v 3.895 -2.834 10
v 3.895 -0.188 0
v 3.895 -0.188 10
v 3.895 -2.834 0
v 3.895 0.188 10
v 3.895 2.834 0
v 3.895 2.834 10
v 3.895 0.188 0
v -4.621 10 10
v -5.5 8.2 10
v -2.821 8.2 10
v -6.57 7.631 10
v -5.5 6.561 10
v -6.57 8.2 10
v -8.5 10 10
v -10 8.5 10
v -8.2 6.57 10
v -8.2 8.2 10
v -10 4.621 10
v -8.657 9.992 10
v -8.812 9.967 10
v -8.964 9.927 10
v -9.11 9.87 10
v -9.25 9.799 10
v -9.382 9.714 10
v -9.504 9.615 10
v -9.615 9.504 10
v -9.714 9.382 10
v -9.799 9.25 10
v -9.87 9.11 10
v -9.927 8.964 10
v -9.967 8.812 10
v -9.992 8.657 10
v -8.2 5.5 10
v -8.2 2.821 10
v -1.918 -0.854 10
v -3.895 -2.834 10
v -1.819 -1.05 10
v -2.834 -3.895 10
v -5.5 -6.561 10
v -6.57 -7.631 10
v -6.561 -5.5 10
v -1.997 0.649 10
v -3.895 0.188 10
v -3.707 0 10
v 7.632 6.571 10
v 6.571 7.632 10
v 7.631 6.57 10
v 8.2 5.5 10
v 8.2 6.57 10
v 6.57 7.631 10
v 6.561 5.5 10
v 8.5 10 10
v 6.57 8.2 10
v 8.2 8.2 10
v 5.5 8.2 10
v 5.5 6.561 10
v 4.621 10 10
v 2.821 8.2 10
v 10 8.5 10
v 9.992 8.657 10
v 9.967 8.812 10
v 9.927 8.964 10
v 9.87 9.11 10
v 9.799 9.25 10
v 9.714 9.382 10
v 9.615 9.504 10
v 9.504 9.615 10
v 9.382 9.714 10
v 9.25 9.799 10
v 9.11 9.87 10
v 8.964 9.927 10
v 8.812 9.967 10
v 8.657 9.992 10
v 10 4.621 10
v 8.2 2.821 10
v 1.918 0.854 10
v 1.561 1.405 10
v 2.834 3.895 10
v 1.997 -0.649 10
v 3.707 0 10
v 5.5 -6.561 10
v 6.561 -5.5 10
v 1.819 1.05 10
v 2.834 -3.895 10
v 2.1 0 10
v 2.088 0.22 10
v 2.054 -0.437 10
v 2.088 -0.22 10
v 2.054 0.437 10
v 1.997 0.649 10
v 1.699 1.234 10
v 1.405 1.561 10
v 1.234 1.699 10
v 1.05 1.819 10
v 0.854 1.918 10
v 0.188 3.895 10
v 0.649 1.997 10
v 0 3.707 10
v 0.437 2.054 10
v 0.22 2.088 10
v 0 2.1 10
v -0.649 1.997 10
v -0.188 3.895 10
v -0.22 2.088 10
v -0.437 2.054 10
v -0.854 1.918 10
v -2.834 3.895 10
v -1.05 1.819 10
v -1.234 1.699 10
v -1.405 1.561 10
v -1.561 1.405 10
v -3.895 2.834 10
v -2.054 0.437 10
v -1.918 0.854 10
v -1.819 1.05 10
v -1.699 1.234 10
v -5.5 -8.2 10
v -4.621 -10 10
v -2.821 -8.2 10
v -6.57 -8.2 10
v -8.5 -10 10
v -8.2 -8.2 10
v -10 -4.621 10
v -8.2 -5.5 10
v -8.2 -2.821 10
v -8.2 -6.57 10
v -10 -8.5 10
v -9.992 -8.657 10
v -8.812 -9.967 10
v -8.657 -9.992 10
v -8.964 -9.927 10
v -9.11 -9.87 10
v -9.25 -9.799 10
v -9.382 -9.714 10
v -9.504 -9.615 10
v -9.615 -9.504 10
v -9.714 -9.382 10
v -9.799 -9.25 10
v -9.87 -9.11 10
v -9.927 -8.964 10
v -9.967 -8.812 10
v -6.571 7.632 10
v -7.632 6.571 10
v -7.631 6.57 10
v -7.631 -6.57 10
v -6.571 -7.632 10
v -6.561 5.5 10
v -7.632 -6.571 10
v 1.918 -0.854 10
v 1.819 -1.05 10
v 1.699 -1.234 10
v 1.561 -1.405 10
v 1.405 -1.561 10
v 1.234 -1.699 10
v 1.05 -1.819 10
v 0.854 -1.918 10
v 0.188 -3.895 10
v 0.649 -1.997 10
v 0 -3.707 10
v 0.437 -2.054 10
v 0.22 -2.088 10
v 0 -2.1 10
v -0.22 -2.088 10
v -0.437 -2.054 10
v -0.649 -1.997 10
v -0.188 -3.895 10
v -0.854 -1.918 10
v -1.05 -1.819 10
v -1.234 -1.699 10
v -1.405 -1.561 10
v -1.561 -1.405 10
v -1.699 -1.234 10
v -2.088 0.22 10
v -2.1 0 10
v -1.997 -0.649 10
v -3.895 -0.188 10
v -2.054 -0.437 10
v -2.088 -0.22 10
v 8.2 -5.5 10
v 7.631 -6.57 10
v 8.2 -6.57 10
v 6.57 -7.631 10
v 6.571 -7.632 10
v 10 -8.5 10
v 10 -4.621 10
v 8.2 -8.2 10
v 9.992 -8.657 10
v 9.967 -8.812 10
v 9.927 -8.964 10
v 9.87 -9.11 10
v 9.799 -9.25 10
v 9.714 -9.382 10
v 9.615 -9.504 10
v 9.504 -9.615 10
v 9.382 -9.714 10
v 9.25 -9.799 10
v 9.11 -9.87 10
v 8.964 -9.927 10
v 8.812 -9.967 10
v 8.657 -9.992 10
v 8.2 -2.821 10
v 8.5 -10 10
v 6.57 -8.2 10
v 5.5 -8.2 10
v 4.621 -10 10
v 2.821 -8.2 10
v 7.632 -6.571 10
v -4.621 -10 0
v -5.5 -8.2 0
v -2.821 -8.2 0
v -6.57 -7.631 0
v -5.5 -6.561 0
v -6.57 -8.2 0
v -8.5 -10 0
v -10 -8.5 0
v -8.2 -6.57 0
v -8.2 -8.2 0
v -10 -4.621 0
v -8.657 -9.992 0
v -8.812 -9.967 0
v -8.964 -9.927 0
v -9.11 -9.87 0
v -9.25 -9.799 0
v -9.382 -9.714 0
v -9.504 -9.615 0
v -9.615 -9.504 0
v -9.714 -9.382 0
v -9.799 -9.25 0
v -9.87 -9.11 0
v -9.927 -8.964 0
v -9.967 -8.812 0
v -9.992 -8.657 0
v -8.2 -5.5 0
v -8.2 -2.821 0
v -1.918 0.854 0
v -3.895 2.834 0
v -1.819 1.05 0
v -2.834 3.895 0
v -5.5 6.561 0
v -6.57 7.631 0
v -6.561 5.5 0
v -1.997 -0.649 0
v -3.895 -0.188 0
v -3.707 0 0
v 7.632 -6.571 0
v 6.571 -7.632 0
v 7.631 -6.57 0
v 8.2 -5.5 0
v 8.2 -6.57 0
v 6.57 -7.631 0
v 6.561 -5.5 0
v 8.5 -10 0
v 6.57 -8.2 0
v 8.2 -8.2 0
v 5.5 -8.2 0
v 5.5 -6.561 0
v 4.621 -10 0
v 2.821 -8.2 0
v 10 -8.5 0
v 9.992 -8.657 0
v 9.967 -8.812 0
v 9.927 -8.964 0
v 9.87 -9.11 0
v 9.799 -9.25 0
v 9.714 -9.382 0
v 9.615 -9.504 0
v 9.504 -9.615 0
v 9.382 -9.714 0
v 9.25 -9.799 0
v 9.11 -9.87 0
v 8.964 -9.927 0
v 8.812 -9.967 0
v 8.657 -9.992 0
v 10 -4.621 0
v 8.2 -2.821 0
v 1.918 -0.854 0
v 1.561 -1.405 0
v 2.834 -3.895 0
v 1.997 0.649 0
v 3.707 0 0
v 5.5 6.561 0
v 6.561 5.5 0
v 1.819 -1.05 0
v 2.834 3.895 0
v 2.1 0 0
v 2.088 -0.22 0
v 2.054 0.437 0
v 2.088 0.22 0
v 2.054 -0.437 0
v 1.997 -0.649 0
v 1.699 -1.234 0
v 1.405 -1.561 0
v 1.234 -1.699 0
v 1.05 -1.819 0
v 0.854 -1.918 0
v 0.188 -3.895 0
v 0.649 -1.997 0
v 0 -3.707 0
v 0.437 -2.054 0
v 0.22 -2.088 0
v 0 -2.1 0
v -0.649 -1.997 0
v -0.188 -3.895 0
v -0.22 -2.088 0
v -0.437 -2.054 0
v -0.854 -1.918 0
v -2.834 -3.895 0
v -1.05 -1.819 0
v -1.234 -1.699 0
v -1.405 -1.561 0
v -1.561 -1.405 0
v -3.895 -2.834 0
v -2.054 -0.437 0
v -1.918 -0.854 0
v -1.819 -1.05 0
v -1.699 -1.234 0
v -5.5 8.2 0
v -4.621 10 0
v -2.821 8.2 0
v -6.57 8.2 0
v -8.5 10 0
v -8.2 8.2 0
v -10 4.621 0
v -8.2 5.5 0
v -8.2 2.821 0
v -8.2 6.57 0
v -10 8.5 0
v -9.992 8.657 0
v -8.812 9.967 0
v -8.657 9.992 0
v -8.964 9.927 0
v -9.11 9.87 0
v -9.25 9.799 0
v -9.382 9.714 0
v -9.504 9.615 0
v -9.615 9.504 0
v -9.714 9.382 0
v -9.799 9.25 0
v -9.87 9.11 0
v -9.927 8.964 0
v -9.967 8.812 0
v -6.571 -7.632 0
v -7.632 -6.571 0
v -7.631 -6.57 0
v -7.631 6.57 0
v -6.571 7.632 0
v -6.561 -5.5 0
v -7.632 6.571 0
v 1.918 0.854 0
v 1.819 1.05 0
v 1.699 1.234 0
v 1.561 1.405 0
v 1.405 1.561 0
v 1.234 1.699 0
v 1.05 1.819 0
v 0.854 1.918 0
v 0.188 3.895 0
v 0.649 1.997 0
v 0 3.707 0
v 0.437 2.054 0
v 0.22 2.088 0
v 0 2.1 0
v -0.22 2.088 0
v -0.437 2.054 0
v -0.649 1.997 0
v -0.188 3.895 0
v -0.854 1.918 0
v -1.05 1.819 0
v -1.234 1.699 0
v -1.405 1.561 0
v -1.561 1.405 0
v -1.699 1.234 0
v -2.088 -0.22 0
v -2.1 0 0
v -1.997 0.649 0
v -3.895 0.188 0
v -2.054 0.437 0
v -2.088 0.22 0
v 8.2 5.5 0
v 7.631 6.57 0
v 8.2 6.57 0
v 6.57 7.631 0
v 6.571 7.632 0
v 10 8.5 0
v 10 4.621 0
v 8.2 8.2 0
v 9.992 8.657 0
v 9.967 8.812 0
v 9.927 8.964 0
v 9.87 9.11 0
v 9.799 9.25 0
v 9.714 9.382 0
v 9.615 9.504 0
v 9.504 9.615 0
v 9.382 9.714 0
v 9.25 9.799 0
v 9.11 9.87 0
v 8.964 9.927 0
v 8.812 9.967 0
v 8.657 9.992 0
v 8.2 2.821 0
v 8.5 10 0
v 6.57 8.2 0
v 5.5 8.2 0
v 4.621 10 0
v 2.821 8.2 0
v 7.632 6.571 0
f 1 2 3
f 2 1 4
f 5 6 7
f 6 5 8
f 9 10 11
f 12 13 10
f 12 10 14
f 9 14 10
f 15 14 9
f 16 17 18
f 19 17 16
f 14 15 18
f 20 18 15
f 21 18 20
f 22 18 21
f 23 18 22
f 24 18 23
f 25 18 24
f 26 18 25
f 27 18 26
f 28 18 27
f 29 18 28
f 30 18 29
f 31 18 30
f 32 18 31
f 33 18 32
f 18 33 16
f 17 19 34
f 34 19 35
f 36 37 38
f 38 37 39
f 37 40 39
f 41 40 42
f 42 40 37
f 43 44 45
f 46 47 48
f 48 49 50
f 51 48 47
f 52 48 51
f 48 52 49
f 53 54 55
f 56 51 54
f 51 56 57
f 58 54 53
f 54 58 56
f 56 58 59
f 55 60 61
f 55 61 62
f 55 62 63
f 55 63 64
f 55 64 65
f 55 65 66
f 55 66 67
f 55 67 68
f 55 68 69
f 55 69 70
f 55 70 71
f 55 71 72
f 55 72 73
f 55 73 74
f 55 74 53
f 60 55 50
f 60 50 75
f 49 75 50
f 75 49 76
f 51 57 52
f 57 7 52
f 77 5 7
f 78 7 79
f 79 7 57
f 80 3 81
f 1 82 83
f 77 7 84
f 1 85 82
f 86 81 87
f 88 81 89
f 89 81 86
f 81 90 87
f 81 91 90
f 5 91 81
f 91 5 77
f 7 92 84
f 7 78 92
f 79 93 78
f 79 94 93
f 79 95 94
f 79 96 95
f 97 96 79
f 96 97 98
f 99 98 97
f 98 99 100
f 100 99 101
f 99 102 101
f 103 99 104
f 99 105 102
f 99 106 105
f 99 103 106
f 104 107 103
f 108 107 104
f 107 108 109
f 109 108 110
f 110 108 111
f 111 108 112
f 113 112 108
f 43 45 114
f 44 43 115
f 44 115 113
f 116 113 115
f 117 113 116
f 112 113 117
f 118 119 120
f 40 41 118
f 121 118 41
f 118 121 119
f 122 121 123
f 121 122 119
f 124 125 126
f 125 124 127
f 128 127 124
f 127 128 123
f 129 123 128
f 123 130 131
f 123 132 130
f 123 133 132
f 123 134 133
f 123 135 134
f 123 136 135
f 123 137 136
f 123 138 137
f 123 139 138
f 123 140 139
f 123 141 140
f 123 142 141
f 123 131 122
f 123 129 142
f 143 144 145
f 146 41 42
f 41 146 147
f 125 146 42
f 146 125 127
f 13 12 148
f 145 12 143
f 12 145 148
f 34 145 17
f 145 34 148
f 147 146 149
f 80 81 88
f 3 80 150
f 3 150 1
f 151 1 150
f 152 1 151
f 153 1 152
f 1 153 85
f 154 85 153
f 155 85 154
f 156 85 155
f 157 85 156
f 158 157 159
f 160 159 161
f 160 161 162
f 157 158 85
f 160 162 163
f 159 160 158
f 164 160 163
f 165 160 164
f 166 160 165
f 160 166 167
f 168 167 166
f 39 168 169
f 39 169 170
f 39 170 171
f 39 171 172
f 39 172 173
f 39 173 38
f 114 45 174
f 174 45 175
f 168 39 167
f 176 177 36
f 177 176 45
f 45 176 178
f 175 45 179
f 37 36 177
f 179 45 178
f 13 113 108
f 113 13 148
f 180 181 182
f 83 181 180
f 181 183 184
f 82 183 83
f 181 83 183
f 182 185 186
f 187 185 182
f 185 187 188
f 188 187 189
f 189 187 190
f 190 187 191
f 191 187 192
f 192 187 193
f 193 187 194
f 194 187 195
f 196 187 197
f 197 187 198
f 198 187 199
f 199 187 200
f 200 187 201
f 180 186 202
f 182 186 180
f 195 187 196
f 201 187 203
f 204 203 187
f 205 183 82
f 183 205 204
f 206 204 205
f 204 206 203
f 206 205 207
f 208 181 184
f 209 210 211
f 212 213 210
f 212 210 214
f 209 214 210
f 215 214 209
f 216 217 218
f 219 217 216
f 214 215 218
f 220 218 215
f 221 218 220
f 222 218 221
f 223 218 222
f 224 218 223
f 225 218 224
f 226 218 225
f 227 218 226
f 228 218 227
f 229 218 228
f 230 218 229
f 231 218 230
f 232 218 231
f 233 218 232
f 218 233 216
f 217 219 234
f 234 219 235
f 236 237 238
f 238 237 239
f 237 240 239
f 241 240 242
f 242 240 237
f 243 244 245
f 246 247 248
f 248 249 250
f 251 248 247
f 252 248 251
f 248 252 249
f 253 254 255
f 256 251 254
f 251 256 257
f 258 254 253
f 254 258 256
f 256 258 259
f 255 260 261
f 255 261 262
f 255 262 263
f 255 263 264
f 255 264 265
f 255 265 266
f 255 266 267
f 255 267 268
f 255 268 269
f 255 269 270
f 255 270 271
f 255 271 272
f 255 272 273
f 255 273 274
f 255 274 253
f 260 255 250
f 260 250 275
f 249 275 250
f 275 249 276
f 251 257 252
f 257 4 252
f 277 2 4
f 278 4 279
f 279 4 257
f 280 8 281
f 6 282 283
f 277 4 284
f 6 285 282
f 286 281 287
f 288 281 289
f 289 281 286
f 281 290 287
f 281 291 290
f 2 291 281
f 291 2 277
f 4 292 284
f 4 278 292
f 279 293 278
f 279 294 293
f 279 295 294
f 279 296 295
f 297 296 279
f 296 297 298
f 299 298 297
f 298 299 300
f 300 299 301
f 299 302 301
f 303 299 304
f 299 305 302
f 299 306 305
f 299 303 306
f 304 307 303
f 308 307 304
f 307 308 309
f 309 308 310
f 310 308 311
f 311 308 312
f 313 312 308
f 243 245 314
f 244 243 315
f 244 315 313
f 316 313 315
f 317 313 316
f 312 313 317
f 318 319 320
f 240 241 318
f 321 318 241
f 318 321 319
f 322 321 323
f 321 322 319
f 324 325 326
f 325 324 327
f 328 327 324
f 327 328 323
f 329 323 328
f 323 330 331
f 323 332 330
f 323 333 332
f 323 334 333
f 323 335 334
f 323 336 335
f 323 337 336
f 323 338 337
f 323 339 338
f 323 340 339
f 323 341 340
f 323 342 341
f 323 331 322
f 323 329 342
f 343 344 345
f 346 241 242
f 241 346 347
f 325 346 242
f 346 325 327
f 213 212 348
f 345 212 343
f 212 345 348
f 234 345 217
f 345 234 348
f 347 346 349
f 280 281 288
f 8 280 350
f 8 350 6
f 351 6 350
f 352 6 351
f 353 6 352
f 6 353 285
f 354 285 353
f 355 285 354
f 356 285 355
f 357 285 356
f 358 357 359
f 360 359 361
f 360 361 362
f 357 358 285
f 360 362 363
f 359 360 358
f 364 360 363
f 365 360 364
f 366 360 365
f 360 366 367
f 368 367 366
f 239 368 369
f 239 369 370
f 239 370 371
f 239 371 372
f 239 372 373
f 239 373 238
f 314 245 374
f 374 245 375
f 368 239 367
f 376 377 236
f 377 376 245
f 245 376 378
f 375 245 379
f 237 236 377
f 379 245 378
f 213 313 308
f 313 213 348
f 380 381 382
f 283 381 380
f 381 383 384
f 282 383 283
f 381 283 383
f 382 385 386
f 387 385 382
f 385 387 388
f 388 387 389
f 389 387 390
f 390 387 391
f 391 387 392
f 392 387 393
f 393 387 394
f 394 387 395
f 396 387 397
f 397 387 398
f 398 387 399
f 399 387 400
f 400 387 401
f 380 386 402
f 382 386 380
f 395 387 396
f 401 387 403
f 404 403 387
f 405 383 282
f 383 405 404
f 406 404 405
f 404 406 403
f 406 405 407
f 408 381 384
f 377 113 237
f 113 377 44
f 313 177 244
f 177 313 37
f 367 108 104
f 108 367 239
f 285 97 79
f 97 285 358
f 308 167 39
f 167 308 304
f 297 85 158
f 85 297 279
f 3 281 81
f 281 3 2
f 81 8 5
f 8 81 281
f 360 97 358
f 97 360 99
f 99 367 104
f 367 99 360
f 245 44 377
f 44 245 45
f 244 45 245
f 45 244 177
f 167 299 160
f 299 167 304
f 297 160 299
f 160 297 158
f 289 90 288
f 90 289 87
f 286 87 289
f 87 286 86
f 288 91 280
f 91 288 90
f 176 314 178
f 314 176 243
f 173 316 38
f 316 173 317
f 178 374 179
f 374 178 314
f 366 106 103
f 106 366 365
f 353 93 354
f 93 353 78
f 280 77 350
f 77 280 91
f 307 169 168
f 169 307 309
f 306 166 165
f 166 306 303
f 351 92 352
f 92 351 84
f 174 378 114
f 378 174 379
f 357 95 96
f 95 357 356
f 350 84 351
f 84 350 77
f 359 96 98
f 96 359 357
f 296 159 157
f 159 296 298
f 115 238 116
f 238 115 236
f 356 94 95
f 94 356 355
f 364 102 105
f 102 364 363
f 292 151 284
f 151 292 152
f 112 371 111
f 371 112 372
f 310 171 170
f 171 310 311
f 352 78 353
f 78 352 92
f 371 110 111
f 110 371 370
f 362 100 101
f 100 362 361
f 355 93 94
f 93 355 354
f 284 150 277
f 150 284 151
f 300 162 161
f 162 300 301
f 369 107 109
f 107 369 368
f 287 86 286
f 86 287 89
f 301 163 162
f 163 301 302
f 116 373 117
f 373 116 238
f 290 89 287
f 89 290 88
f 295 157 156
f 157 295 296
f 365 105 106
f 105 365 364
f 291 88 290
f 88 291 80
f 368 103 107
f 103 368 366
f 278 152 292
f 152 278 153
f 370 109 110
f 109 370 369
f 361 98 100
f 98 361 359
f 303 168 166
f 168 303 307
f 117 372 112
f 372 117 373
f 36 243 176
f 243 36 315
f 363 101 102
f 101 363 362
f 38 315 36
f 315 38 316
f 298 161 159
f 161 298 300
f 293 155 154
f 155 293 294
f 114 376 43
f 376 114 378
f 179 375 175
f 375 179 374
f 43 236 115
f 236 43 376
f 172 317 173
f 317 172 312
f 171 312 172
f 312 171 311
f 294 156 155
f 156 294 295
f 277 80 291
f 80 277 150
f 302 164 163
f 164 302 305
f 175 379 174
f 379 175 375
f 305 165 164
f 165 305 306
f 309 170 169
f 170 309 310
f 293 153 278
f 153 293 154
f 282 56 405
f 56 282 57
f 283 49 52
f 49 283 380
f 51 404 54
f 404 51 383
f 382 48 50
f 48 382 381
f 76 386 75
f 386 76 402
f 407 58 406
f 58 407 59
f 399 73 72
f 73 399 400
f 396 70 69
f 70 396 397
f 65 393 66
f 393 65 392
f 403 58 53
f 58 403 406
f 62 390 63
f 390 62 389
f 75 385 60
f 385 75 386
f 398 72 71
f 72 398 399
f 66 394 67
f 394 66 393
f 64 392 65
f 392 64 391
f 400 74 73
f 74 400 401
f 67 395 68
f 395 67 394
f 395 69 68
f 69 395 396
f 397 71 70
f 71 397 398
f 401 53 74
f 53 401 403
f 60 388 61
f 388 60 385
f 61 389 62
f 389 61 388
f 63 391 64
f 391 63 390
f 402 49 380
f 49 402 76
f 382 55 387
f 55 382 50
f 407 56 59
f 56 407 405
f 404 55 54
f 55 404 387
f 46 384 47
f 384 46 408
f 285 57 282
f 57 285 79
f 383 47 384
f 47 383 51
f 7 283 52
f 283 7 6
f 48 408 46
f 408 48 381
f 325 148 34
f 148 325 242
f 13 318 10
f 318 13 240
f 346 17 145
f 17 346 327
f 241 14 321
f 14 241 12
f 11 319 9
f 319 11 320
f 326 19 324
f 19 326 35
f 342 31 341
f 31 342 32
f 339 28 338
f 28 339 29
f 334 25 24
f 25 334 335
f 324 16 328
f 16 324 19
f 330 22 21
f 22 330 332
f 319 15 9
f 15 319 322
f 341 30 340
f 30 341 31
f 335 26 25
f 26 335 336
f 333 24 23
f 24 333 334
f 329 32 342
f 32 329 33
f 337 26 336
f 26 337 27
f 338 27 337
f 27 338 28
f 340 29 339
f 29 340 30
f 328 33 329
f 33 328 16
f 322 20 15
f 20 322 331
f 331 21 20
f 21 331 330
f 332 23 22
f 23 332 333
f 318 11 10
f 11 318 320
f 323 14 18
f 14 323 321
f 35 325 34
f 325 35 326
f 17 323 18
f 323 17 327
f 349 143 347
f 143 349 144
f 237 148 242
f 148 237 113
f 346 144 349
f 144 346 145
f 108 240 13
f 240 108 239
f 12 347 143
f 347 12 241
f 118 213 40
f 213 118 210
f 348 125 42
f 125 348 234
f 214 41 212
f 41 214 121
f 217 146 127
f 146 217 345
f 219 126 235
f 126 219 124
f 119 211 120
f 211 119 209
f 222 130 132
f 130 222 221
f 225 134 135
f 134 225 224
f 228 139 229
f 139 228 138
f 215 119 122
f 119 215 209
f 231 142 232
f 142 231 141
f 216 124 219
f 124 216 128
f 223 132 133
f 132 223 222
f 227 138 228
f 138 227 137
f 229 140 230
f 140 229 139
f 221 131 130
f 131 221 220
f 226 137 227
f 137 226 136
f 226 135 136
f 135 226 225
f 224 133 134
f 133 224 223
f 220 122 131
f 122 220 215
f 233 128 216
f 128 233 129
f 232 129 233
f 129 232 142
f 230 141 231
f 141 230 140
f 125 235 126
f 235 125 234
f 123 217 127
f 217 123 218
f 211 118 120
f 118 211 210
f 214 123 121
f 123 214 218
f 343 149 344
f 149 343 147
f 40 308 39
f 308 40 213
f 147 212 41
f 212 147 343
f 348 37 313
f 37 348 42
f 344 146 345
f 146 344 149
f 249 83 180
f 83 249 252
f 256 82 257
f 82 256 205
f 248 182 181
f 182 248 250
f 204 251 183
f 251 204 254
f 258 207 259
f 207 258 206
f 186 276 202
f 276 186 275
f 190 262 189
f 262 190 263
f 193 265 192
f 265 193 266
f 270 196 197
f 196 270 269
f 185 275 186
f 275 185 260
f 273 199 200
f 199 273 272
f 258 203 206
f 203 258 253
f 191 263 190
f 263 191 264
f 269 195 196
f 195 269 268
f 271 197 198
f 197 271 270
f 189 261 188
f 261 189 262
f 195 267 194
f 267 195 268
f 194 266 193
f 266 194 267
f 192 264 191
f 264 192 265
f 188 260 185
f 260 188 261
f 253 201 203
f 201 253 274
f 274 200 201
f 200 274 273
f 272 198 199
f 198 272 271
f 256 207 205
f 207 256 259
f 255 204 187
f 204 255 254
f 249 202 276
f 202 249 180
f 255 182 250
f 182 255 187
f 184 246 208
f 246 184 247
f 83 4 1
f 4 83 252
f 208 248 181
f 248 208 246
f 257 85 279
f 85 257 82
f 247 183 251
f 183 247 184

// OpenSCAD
shape="20x20";//[20x20,20x40,20x60,20x80,40x40,C-Beam]
lenght=10;

//////////////
$fn=60;
module center() {
    difference() {
        
        intersection() {
            translate([0,0,0.5]) cube([7.79,7.79,1],center=true);
            cylinder(d=13.5,h=3,center=true,$fn=4);
        }
            
        
        cylinder(d=4.2,h=3,center=true);
        for(i=[0:90:270]) rotate([0,0,i]) translate([7.2425,0,0]) rotate([0,0,45]) cube(5,center=true);
    }
}




module corner() {
    difference() {
        translate([5.5,5.5,0]) cube([3,3,1]);
        translate([5.5+1.07,5.5+1.07,-0.5]) cube([3,3,2]);
    }
    translate([3,3,0])rotate([0,0,45]) translate([0,-0.75,0]) cube([5.8,1.5,1]);
    difference() {
        hull() {for(i=[0,1],j=[0,1]) translate([i*8.5,j*8.5,0]) cylinder(d=3,h=1);}
        for(i=[0,90]) rotate([0,0,i]) translate([12.45,0,0]) rotate([0,0,45]) cube(10,center=true);
        cube(16.4,center=true);
    }
}

module raccord() {
    translate([-10,0,0]) {
        difference() {
            translate([0,8.2,0]) cube([20,1.8,1]);
            for(i=[0,20]) translate([i,12.45,0]) rotate([0,0,45]) cube(10,center=true);
        }
        translate([10,0,0]) for(i=[-1,1]) scale([i,1,1]) translate([5.39868/2,10-1.8-1.96,0]) cube([1.8,2,1]);
         for(i=[0,1]) translate([i*20,0,0]) rotate([0,0,i*90]) translate([3,3,0])rotate([0,0,45]) translate([0,-0.75,0]) cube([5.33205,1.5,1]);
    }
}

module inner_corner() {
    difference() {
        union() {
            translate([10,0,0]) raccord();
            translate([0,10,0]) rotate([0,0,-90]) raccord();
        }
        translate([0,0,-0.5]) cube([11,8.2,3]);
        translate([0,0,-0.5]) cube([8.2,11,3]);
    }
    translate([3,3,0])rotate([0,0,45]) translate([0,-0.75,0]) cube([9,1.5,1]);  
}


module V_slot(shape,lenght) {
scale([1,1,lenght]) {
    if (shape=="20x20") {
            center();
            for(i=[0:90:270]) rotate([0,0,i]) corner();
        }
        
    else if (shape=="20x40") {
            for(i=[-1,1]) translate([i*10,0,0]) center();
            for(i=[-1,1]) scale([1,i,1]) raccord();
            for(j=[-1,1]) scale([j,1,1]) translate([10,0,0]) for(i=[0,-90]) rotate([0,0,i]) corner();
        }
        
    else if (shape=="20x60") {
            for(i=[-1,0,1]) translate([i*20,0,0]) center();
            for(i=[-1,1]) scale([1,i,1]) for(i=[-1,1]) translate([i*10,0,0]) raccord();
            for(j=[-1,1]) scale([j,1,1]) translate([20,0,0]) for(i=[0,-90]) rotate([0,0,i]) corner();
        }
        
    else if (shape=="20x80") {
            for(i=[-3,-1,1,3]) translate([i*10,0,0]) center();
            for(i=[-1,1]) scale([1,i,1]) for(i=[-1,0,1]) translate([i*20,0,0]) raccord();
            for(j=[-1,1]) scale([j,1,1]) translate([30,0,0]) for(i=[0,-90]) rotate([0,0,i]) corner();
        }
        
    else if (shape=="40x40") {
            for(i=[0:90:270]) rotate([0,0,i]) {
                translate([10,10,0]) center();
                translate([0,10,0]) raccord();
                translate([10,10,0]) corner();
            }
        }
        
    else {

        for(i=[-3,-1,1,3]) translate([i*10,-10,0]) center();
        for(i=[-3,,3]) translate([i*10,10,0]) center();
            
        scale([1,-1,1]) for(i=[-1,0,1]) translate([i*20,10,0]) raccord();
        for(i=[-90,90]) rotate([0,0,i]) translate([0,30,0]) raccord();
        translate([0,-10,0]) raccord();
            
        for(j=[-1,1]) scale([j,1,1]) translate([30,-10,0]) rotate([0,0,-90]) corner();
        for(j=[-1,1]) scale([j,1,1]) translate([30,10,0]) for(i=[0,90]) rotate([0,0,i]) corner();
        
        for(j=[-1,1]) scale([j,1,1]) translate([-30,-10,0]) inner_corner();
    
    }
}

}

V_slot(shape,lenght);
